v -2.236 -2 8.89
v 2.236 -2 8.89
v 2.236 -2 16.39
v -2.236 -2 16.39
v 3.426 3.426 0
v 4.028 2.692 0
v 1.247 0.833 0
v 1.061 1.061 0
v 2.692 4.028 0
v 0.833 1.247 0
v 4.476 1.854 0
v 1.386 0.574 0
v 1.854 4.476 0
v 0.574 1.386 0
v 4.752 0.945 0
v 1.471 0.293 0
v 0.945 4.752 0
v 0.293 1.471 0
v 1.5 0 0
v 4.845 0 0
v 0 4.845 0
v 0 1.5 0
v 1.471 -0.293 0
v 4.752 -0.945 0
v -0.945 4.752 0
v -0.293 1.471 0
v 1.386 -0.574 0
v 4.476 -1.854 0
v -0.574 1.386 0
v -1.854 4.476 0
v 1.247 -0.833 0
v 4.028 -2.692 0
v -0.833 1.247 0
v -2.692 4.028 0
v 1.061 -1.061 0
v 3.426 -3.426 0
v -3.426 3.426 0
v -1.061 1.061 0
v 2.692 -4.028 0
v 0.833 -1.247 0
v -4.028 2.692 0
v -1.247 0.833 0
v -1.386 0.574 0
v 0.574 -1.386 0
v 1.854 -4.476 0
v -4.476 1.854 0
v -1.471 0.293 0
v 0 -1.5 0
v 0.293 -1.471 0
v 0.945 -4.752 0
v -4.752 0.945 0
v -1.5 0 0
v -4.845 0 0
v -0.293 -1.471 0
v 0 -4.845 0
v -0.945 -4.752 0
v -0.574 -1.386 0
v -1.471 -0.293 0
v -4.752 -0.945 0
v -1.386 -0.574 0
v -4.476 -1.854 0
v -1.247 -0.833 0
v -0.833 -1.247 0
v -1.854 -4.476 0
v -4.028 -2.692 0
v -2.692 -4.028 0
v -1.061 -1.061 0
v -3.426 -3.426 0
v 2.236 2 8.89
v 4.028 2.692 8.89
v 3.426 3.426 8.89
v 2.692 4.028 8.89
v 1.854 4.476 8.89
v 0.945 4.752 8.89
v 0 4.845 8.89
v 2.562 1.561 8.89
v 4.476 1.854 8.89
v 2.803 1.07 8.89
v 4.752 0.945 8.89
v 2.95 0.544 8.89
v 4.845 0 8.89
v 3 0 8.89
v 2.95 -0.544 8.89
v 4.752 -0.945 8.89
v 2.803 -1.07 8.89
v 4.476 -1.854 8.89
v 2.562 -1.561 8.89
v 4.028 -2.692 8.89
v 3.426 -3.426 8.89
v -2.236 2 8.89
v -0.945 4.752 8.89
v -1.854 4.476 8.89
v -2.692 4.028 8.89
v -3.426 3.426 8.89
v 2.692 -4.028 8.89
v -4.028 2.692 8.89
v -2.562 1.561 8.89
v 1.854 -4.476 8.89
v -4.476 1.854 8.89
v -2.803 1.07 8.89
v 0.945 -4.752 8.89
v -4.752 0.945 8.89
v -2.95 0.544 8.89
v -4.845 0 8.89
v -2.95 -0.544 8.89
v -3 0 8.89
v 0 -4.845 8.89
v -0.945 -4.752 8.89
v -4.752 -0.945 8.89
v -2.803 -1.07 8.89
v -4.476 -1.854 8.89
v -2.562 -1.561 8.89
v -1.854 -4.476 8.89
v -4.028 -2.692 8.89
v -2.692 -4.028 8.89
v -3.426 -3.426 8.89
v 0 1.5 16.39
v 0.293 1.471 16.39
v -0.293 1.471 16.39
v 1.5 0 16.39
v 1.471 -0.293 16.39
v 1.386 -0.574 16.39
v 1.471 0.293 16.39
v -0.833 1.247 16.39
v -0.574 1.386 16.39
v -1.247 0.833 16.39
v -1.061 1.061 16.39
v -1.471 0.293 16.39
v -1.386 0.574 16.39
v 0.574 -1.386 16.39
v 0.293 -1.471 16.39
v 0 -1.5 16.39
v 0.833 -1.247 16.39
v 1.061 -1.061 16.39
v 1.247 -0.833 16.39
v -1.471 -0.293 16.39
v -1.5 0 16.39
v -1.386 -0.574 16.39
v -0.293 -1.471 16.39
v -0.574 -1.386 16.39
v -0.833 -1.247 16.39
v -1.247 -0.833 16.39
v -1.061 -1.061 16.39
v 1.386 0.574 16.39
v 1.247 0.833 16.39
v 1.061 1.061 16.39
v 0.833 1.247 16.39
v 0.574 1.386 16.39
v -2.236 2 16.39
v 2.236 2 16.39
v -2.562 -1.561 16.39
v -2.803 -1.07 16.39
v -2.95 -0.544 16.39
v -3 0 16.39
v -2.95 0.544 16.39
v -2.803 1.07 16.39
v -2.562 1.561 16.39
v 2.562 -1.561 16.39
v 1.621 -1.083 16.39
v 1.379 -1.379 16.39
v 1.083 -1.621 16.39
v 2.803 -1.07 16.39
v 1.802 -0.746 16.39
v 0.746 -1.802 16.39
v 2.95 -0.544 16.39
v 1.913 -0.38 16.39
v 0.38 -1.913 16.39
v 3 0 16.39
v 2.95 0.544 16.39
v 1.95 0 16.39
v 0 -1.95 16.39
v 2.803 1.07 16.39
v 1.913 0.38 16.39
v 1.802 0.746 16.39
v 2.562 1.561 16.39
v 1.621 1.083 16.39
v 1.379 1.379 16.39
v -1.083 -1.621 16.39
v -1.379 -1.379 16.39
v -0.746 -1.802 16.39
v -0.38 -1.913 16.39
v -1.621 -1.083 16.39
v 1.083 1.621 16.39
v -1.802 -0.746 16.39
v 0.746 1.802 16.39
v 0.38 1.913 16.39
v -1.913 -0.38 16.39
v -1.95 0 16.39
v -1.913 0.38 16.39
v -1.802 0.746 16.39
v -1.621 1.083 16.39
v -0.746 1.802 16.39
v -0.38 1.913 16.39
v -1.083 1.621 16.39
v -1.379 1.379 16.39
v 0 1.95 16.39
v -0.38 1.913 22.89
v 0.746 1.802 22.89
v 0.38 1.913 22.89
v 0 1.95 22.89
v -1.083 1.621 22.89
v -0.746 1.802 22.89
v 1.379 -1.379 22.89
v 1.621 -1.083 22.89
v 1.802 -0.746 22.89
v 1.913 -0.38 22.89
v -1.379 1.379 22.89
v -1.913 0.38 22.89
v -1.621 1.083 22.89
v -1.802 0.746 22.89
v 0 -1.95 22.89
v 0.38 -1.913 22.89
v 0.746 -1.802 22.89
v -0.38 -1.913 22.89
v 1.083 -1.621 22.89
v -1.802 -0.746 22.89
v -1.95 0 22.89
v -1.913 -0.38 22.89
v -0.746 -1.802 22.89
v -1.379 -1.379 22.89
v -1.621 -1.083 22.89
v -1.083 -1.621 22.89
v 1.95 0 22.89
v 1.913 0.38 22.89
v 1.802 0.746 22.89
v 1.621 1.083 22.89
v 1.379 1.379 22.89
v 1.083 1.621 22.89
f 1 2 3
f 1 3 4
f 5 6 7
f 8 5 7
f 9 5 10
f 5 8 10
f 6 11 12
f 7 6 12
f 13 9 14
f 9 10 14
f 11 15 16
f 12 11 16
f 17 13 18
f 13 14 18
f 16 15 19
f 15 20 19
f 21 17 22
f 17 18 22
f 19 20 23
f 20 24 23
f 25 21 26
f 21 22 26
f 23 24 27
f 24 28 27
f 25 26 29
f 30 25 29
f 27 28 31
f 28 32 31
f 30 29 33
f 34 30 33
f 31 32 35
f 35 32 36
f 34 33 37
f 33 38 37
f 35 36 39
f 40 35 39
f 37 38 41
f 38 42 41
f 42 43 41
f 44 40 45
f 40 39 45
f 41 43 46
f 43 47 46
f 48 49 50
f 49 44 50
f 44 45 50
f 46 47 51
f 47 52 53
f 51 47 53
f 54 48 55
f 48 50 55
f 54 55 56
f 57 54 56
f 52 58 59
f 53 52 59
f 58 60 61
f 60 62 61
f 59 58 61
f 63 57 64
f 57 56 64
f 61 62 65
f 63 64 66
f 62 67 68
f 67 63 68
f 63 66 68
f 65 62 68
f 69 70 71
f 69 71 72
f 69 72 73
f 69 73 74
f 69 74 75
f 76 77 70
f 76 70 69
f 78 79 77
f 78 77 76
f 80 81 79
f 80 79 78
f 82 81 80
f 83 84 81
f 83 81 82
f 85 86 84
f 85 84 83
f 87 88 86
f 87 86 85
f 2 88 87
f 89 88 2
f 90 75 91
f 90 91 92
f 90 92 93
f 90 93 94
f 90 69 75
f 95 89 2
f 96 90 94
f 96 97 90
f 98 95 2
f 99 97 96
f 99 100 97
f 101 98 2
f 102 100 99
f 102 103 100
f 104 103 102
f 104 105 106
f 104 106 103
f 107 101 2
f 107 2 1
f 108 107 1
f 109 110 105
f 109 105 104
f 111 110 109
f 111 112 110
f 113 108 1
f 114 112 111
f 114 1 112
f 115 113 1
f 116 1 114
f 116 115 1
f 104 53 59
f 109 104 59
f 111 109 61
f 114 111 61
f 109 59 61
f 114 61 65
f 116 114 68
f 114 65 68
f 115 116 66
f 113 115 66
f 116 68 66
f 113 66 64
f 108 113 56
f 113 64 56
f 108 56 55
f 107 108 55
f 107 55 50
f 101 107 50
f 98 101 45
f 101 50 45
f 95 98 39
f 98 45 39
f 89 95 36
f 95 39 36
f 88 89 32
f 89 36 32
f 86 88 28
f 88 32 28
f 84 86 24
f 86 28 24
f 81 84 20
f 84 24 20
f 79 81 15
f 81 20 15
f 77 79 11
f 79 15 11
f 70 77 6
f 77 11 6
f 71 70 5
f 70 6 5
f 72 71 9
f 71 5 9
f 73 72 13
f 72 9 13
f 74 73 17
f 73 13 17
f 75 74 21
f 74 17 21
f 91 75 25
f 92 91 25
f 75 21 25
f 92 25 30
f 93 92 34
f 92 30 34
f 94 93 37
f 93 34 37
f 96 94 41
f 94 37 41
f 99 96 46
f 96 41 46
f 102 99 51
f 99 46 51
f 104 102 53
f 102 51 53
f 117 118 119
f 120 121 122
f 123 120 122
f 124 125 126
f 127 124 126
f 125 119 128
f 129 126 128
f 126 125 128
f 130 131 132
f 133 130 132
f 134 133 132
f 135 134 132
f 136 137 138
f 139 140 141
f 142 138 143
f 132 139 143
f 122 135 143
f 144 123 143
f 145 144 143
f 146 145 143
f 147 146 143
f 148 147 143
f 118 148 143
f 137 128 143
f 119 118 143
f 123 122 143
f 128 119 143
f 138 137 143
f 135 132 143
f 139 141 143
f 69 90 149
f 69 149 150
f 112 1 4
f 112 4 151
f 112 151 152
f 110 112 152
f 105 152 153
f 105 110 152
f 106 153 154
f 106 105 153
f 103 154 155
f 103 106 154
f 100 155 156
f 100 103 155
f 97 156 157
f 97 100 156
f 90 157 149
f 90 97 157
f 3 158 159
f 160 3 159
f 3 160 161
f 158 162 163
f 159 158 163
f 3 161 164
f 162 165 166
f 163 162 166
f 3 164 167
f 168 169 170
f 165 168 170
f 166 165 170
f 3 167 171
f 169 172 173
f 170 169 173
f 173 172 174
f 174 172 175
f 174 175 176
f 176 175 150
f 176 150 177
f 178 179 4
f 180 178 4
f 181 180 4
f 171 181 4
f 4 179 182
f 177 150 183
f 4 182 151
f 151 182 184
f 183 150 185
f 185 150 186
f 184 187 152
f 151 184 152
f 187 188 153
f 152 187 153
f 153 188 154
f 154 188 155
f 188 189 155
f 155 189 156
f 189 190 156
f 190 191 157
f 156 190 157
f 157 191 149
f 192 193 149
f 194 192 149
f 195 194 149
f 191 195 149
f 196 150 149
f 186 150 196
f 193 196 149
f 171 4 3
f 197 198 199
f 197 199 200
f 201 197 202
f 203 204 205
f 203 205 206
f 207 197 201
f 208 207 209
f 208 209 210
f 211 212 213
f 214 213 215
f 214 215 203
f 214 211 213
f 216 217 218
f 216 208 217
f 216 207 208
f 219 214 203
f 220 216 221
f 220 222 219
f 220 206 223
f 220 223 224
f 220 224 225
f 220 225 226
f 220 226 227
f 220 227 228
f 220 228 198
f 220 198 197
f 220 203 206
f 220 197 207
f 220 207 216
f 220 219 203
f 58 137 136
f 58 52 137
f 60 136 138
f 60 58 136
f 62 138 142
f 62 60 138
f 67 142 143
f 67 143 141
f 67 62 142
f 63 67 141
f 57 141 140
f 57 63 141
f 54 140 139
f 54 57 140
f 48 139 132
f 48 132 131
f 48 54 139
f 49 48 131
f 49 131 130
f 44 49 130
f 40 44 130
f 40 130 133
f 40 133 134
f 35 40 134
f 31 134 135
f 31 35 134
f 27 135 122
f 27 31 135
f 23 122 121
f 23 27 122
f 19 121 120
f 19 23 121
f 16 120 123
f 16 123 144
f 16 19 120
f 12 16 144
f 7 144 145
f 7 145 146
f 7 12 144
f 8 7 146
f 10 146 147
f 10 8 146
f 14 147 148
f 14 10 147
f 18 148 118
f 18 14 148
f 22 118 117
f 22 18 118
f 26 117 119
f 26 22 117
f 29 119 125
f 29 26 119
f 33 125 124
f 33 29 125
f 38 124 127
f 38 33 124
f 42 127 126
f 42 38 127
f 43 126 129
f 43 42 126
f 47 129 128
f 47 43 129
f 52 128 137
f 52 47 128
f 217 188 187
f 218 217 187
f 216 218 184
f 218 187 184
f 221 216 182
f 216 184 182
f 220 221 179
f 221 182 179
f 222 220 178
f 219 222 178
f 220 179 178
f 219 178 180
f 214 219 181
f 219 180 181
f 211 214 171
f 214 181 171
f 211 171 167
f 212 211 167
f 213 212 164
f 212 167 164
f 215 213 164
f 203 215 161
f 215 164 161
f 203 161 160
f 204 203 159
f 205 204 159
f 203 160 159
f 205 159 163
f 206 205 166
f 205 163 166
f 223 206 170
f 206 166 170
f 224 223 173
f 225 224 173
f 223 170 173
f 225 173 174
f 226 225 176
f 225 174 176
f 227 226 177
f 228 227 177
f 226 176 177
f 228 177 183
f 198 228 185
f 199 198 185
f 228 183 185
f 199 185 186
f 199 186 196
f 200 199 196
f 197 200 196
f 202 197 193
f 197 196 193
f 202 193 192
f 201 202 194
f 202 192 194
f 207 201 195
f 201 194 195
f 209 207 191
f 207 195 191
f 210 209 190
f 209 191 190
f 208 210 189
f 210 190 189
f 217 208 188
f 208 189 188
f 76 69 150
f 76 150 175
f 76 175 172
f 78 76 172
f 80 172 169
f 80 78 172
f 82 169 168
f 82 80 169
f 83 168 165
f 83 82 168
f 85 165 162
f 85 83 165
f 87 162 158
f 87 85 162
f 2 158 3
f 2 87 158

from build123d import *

# Parameters (mm, degrees)
SKETCH1_R           = 4.845
SKETCH1_R_2         = 1.5
BOSS_EXTRUDE1_DEPTH = 8.89
SKETCH2_R           = 1.5
BOSS_EXTRUDE2_DEPTH = 7.5
SKETCH3_R           = 1.95
BOSS_EXTRUDE3_DEPTH = 6.5


with BuildPart() as part:
    # Sketch1 → Boss-Extrude1 (new body)
    with BuildSketch(Plane.XY):
        with Locations(Location((0, 0, 0), (0, 0, 180))):
            Circle(SKETCH1_R)
        with Locations(Location((0, 0, 0), (0, 0, 180))):
            Circle(SKETCH1_R_2, mode=Mode.SUBTRACT)
    extrude(amount=BOSS_EXTRUDE1_DEPTH)

    # Sketch2 → Boss-Extrude2 (add)
    with BuildSketch(Plane.XY.offset(8.89)):
        with BuildLine():
            Line((-2.236067977, 2), (2.236067977, 2))
            ThreePointArc((2.236067977, 2), (3, 0), (2.236067977, -2))
            Line((2.236067977, -2), (-2.236067977, -2))
            ThreePointArc((-2.236067977, -2), (-3, 0), (-2.236067977, 2))
        make_face()
        with Locations(Location((0, 0, 0), (0, 0, 180))):
            Circle(SKETCH2_R, mode=Mode.SUBTRACT)
    extrude(amount=BOSS_EXTRUDE2_DEPTH)

    # Sketch3 → Boss-Extrude3 (add)
    with BuildSketch(Plane.XY.offset(16.39)):
        with Locations(Location((0, 0, 0), (0, 0, 180))):
            Circle(SKETCH3_R)
    extrude(amount=BOSS_EXTRUDE3_DEPTH)


solid = part.part
